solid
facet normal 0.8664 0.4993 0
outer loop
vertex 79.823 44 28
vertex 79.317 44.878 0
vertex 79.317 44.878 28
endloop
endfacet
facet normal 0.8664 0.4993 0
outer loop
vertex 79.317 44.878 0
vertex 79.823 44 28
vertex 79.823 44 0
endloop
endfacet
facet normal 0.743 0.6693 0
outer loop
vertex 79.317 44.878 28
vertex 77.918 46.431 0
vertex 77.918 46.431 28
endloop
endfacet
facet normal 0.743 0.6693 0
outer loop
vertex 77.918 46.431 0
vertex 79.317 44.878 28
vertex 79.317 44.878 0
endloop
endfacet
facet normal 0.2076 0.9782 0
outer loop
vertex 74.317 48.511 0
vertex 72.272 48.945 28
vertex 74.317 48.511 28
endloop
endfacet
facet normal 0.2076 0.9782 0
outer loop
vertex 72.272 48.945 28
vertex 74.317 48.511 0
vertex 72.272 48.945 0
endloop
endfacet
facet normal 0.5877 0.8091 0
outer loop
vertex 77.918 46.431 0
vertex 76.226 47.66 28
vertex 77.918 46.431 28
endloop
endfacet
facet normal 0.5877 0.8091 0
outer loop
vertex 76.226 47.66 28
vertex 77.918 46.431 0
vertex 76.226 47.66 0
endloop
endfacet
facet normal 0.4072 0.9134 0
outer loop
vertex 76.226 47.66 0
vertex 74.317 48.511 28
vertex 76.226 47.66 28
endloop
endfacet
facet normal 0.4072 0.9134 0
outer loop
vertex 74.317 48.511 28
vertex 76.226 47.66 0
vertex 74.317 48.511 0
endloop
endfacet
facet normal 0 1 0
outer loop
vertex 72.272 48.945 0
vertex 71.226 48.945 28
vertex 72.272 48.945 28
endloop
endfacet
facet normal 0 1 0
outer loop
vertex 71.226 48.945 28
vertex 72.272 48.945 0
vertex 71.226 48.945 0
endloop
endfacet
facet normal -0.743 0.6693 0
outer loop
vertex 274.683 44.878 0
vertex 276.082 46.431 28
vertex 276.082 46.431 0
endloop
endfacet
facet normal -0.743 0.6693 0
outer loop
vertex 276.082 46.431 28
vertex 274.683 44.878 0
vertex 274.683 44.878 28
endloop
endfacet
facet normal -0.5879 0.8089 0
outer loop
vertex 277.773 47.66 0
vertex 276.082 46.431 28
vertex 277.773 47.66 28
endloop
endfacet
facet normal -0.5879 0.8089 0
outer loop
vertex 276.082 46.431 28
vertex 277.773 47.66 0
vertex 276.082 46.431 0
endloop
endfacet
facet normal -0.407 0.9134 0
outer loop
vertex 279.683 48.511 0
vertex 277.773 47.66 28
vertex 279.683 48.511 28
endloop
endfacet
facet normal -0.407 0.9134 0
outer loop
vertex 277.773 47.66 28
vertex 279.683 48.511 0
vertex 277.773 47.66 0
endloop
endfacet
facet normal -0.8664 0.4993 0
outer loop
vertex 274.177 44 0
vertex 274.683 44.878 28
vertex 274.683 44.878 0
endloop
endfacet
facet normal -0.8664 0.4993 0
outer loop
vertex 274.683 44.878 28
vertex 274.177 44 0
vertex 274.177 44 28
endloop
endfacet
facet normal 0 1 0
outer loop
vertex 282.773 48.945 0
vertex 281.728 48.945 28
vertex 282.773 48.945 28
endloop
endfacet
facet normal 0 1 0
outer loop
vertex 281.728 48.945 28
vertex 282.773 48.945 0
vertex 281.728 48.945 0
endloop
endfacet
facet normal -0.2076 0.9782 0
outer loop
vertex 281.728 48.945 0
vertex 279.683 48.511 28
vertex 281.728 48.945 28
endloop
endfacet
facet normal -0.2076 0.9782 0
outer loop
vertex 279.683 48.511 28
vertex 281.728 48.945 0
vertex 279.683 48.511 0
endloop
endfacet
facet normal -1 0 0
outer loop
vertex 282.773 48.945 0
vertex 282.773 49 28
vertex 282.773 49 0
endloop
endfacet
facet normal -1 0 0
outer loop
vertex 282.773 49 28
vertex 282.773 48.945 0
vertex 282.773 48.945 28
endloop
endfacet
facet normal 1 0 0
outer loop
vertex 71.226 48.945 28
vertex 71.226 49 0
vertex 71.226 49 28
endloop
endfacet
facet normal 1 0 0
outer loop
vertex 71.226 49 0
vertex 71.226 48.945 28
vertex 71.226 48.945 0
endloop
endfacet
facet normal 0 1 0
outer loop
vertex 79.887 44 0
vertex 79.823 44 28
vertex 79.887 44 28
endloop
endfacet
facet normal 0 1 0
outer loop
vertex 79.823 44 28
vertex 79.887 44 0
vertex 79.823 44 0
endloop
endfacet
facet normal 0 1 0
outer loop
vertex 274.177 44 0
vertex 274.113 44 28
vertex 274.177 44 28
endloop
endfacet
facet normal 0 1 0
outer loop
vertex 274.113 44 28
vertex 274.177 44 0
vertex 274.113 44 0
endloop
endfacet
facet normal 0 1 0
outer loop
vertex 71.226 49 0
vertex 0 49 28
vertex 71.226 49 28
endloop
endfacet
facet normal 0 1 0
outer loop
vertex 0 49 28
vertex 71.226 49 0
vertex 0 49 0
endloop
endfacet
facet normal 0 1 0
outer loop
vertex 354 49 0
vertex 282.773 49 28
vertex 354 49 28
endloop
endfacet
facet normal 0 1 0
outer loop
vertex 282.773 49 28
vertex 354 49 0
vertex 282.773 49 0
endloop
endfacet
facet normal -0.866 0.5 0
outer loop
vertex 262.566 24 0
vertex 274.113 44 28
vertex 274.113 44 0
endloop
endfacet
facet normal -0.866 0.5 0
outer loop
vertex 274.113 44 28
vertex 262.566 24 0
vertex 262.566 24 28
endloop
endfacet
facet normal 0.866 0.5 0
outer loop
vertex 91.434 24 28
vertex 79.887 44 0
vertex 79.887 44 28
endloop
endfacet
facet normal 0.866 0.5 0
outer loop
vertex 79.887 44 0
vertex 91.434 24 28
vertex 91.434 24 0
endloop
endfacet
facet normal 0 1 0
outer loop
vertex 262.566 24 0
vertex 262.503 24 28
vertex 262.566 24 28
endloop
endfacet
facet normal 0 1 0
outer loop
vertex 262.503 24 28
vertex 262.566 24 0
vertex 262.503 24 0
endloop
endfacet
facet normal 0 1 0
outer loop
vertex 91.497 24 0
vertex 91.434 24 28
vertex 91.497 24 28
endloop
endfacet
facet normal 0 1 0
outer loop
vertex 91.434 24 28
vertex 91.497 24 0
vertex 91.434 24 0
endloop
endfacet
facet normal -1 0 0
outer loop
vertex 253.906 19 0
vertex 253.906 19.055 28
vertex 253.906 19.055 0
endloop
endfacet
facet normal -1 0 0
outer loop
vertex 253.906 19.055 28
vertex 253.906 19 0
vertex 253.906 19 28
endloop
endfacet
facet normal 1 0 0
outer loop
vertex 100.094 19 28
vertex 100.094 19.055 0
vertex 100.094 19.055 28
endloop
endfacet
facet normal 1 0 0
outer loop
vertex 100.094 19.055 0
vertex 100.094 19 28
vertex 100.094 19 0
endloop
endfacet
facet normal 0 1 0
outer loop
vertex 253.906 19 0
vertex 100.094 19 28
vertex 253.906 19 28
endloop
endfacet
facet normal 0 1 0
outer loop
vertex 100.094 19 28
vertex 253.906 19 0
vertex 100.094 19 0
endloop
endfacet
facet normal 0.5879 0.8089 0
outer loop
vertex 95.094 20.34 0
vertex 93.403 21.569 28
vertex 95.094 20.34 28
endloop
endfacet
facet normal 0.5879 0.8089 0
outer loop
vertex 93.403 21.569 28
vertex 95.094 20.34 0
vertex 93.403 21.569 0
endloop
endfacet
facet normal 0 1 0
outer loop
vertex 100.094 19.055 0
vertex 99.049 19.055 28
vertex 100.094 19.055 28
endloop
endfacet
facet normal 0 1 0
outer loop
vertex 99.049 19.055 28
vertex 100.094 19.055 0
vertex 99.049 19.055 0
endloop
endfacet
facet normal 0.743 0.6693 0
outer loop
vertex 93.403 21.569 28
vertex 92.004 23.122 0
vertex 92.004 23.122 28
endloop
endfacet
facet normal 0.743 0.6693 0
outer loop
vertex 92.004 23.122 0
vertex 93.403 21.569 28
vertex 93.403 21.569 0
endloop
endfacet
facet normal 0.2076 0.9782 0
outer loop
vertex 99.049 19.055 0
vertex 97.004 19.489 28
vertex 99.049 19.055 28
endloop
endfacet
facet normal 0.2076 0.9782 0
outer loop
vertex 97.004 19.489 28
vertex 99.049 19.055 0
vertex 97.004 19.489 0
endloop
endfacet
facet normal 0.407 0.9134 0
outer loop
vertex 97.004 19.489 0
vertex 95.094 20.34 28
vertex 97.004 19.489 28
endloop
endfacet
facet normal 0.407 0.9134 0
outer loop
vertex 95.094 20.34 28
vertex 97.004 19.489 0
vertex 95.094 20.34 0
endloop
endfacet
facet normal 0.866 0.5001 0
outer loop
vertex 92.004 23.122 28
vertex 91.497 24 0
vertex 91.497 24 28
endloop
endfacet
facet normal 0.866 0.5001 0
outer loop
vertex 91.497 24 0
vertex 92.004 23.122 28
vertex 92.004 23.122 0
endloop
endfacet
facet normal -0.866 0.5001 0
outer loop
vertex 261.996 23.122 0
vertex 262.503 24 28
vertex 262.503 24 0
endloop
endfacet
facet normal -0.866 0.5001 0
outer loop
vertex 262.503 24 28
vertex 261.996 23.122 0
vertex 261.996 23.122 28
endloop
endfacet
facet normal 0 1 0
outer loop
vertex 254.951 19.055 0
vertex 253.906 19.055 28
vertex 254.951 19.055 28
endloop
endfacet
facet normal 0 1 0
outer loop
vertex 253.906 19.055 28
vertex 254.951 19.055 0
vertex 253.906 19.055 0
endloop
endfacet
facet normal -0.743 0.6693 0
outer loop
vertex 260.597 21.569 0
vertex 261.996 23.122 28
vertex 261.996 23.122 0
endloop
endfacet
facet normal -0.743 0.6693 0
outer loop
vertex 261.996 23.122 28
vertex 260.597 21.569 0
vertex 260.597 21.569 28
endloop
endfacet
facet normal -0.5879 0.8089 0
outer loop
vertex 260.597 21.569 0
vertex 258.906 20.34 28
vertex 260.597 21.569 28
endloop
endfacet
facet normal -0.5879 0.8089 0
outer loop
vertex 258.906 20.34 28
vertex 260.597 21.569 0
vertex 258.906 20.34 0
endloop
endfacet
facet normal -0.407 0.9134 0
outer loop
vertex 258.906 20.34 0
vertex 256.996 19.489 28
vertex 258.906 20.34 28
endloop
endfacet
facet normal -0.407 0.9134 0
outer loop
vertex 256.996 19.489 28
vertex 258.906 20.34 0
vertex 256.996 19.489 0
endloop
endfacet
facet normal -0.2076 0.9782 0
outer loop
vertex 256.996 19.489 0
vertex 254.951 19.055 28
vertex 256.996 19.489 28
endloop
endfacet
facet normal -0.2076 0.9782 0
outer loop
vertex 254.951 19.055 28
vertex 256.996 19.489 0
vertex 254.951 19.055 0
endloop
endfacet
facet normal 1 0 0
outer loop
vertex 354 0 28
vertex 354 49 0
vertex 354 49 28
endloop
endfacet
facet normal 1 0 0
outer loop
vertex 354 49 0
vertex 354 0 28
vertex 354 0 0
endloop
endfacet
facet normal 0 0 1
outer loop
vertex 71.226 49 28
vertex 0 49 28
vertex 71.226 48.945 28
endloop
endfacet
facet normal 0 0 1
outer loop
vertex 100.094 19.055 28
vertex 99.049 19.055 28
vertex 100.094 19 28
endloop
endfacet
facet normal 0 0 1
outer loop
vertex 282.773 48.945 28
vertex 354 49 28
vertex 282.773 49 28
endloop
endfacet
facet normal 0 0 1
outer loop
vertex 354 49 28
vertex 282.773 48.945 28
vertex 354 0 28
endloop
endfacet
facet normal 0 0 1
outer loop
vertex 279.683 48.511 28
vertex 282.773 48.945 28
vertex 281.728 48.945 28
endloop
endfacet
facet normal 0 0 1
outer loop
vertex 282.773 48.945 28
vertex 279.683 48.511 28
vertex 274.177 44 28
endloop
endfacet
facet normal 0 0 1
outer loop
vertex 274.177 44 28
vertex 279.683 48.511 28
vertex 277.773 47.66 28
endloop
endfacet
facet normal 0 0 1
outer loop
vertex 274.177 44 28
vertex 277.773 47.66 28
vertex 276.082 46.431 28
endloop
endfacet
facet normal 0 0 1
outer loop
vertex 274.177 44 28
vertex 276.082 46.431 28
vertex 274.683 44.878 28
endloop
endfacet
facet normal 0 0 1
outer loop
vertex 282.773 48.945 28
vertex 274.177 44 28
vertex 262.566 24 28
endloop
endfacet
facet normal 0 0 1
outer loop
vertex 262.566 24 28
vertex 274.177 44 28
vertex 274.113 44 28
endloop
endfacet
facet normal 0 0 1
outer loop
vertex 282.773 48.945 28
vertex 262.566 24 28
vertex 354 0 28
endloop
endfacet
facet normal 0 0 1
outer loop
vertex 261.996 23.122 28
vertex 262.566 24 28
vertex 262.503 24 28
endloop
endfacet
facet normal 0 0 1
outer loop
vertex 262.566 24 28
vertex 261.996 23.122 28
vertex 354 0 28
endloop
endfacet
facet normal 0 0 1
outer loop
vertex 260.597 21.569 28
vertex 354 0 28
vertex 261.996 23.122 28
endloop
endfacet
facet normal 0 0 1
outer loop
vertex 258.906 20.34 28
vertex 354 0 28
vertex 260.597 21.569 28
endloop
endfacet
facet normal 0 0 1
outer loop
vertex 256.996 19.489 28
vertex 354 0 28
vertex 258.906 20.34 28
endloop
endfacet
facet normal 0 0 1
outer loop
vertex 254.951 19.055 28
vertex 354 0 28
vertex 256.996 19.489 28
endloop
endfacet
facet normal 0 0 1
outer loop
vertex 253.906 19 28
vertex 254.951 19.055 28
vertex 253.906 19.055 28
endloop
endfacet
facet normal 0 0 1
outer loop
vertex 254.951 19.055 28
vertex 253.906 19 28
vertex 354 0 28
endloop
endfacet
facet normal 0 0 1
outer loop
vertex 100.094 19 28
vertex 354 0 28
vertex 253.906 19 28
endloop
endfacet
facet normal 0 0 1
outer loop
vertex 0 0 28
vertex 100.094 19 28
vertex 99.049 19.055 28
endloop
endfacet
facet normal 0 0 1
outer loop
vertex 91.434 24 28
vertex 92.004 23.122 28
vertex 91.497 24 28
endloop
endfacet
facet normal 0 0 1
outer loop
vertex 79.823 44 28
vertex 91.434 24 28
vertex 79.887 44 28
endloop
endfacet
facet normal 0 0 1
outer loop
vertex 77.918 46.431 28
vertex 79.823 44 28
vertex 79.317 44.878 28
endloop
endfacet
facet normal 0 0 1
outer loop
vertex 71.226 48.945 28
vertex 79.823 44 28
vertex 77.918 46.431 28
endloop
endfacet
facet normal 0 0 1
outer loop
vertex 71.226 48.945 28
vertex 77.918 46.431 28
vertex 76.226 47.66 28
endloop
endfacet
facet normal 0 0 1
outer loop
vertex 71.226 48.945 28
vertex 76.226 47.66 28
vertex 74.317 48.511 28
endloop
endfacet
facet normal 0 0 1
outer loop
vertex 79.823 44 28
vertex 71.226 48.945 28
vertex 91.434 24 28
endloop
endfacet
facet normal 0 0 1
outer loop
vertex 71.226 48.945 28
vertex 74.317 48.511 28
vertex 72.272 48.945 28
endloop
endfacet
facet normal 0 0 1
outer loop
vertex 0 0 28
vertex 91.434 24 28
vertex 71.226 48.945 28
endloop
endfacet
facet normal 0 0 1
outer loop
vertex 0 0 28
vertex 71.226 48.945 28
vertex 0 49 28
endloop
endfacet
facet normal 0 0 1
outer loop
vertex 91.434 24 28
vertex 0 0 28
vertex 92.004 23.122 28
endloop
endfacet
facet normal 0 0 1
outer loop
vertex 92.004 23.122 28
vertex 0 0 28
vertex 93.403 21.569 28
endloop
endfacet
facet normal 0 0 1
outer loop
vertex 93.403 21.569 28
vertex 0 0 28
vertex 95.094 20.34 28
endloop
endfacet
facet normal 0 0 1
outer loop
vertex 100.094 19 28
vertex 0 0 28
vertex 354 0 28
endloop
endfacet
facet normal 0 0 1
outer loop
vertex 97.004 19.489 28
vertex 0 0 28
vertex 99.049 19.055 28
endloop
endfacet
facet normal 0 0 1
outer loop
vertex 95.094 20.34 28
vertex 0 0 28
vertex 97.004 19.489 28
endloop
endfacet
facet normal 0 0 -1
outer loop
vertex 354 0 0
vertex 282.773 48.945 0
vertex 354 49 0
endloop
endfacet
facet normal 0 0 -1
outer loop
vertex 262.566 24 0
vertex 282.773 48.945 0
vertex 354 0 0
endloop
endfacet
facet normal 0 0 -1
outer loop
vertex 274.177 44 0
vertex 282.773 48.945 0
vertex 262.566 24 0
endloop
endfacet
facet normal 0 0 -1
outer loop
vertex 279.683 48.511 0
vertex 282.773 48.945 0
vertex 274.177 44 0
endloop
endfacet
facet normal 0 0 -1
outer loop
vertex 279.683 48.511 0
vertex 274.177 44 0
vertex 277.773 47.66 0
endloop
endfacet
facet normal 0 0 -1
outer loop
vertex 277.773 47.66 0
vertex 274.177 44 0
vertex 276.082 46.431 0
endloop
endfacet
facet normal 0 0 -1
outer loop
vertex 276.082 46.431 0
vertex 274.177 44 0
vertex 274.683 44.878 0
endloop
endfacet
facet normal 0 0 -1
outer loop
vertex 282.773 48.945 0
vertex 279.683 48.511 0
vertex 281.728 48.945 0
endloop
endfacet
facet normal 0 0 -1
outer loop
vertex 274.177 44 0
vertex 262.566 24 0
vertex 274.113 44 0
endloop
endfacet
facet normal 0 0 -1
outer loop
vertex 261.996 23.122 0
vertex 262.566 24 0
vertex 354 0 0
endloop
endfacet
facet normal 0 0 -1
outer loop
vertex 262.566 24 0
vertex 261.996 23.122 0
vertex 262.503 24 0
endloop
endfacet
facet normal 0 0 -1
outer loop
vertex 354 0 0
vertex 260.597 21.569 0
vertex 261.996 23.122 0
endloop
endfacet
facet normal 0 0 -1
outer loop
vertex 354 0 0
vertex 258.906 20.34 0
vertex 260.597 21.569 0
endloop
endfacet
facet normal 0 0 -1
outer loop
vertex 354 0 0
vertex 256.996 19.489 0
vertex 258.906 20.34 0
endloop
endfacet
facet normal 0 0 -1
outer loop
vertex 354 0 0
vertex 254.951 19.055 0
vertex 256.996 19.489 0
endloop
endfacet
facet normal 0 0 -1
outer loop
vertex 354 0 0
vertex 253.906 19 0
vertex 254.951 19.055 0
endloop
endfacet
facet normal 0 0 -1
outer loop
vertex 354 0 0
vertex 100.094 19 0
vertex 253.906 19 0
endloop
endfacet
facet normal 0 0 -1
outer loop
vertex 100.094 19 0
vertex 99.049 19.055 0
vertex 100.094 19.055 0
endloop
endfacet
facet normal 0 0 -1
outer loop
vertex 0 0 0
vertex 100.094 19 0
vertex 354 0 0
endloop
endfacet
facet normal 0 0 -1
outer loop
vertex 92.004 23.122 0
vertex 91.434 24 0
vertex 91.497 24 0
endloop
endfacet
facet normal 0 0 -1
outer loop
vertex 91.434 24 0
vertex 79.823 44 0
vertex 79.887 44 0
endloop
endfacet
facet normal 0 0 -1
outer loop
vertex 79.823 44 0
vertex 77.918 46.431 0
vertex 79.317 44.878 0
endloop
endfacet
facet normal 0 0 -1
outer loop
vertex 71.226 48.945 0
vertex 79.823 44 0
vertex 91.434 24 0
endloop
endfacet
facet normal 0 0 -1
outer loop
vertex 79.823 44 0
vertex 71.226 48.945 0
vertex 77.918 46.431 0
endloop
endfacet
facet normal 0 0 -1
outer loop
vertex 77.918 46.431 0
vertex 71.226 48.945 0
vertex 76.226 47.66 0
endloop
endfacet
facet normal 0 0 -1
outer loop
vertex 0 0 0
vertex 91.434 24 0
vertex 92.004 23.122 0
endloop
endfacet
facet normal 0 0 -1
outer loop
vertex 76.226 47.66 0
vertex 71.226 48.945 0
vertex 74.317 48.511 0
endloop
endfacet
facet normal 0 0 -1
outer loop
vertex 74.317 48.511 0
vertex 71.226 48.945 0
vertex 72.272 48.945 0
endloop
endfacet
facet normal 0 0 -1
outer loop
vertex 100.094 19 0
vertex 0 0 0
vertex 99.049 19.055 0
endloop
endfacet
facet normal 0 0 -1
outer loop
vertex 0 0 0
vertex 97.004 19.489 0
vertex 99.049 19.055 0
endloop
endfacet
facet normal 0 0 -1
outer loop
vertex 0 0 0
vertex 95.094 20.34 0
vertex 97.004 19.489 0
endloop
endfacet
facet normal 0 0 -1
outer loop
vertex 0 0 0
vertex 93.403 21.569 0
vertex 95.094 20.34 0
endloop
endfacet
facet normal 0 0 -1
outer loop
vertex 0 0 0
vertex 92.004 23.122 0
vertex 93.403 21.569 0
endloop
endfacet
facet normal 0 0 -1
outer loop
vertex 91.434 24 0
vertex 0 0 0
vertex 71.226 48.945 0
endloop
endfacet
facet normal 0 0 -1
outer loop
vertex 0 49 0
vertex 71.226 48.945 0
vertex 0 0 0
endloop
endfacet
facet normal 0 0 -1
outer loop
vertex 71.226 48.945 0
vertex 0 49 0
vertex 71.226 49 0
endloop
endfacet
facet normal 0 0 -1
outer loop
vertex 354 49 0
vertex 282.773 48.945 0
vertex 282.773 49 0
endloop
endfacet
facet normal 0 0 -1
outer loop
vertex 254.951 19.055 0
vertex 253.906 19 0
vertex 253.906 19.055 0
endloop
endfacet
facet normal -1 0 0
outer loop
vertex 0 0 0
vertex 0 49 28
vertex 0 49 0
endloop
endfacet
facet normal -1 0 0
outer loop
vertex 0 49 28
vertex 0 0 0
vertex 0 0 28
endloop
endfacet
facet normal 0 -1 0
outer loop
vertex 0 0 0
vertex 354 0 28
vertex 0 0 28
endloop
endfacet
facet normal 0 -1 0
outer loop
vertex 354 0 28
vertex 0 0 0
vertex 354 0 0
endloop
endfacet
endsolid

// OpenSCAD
include <../src/wardrobe.scad>;
plank_yz_middle_bottom();
//github_openscad -o wardrobe_2/plank_yz_middle_bottom.stl -D wardrobe_n=2 -D cutting_edge=0 -D break_view_length=0 wardrobe_2/plank_yz_middle_bottom_stl.scad
